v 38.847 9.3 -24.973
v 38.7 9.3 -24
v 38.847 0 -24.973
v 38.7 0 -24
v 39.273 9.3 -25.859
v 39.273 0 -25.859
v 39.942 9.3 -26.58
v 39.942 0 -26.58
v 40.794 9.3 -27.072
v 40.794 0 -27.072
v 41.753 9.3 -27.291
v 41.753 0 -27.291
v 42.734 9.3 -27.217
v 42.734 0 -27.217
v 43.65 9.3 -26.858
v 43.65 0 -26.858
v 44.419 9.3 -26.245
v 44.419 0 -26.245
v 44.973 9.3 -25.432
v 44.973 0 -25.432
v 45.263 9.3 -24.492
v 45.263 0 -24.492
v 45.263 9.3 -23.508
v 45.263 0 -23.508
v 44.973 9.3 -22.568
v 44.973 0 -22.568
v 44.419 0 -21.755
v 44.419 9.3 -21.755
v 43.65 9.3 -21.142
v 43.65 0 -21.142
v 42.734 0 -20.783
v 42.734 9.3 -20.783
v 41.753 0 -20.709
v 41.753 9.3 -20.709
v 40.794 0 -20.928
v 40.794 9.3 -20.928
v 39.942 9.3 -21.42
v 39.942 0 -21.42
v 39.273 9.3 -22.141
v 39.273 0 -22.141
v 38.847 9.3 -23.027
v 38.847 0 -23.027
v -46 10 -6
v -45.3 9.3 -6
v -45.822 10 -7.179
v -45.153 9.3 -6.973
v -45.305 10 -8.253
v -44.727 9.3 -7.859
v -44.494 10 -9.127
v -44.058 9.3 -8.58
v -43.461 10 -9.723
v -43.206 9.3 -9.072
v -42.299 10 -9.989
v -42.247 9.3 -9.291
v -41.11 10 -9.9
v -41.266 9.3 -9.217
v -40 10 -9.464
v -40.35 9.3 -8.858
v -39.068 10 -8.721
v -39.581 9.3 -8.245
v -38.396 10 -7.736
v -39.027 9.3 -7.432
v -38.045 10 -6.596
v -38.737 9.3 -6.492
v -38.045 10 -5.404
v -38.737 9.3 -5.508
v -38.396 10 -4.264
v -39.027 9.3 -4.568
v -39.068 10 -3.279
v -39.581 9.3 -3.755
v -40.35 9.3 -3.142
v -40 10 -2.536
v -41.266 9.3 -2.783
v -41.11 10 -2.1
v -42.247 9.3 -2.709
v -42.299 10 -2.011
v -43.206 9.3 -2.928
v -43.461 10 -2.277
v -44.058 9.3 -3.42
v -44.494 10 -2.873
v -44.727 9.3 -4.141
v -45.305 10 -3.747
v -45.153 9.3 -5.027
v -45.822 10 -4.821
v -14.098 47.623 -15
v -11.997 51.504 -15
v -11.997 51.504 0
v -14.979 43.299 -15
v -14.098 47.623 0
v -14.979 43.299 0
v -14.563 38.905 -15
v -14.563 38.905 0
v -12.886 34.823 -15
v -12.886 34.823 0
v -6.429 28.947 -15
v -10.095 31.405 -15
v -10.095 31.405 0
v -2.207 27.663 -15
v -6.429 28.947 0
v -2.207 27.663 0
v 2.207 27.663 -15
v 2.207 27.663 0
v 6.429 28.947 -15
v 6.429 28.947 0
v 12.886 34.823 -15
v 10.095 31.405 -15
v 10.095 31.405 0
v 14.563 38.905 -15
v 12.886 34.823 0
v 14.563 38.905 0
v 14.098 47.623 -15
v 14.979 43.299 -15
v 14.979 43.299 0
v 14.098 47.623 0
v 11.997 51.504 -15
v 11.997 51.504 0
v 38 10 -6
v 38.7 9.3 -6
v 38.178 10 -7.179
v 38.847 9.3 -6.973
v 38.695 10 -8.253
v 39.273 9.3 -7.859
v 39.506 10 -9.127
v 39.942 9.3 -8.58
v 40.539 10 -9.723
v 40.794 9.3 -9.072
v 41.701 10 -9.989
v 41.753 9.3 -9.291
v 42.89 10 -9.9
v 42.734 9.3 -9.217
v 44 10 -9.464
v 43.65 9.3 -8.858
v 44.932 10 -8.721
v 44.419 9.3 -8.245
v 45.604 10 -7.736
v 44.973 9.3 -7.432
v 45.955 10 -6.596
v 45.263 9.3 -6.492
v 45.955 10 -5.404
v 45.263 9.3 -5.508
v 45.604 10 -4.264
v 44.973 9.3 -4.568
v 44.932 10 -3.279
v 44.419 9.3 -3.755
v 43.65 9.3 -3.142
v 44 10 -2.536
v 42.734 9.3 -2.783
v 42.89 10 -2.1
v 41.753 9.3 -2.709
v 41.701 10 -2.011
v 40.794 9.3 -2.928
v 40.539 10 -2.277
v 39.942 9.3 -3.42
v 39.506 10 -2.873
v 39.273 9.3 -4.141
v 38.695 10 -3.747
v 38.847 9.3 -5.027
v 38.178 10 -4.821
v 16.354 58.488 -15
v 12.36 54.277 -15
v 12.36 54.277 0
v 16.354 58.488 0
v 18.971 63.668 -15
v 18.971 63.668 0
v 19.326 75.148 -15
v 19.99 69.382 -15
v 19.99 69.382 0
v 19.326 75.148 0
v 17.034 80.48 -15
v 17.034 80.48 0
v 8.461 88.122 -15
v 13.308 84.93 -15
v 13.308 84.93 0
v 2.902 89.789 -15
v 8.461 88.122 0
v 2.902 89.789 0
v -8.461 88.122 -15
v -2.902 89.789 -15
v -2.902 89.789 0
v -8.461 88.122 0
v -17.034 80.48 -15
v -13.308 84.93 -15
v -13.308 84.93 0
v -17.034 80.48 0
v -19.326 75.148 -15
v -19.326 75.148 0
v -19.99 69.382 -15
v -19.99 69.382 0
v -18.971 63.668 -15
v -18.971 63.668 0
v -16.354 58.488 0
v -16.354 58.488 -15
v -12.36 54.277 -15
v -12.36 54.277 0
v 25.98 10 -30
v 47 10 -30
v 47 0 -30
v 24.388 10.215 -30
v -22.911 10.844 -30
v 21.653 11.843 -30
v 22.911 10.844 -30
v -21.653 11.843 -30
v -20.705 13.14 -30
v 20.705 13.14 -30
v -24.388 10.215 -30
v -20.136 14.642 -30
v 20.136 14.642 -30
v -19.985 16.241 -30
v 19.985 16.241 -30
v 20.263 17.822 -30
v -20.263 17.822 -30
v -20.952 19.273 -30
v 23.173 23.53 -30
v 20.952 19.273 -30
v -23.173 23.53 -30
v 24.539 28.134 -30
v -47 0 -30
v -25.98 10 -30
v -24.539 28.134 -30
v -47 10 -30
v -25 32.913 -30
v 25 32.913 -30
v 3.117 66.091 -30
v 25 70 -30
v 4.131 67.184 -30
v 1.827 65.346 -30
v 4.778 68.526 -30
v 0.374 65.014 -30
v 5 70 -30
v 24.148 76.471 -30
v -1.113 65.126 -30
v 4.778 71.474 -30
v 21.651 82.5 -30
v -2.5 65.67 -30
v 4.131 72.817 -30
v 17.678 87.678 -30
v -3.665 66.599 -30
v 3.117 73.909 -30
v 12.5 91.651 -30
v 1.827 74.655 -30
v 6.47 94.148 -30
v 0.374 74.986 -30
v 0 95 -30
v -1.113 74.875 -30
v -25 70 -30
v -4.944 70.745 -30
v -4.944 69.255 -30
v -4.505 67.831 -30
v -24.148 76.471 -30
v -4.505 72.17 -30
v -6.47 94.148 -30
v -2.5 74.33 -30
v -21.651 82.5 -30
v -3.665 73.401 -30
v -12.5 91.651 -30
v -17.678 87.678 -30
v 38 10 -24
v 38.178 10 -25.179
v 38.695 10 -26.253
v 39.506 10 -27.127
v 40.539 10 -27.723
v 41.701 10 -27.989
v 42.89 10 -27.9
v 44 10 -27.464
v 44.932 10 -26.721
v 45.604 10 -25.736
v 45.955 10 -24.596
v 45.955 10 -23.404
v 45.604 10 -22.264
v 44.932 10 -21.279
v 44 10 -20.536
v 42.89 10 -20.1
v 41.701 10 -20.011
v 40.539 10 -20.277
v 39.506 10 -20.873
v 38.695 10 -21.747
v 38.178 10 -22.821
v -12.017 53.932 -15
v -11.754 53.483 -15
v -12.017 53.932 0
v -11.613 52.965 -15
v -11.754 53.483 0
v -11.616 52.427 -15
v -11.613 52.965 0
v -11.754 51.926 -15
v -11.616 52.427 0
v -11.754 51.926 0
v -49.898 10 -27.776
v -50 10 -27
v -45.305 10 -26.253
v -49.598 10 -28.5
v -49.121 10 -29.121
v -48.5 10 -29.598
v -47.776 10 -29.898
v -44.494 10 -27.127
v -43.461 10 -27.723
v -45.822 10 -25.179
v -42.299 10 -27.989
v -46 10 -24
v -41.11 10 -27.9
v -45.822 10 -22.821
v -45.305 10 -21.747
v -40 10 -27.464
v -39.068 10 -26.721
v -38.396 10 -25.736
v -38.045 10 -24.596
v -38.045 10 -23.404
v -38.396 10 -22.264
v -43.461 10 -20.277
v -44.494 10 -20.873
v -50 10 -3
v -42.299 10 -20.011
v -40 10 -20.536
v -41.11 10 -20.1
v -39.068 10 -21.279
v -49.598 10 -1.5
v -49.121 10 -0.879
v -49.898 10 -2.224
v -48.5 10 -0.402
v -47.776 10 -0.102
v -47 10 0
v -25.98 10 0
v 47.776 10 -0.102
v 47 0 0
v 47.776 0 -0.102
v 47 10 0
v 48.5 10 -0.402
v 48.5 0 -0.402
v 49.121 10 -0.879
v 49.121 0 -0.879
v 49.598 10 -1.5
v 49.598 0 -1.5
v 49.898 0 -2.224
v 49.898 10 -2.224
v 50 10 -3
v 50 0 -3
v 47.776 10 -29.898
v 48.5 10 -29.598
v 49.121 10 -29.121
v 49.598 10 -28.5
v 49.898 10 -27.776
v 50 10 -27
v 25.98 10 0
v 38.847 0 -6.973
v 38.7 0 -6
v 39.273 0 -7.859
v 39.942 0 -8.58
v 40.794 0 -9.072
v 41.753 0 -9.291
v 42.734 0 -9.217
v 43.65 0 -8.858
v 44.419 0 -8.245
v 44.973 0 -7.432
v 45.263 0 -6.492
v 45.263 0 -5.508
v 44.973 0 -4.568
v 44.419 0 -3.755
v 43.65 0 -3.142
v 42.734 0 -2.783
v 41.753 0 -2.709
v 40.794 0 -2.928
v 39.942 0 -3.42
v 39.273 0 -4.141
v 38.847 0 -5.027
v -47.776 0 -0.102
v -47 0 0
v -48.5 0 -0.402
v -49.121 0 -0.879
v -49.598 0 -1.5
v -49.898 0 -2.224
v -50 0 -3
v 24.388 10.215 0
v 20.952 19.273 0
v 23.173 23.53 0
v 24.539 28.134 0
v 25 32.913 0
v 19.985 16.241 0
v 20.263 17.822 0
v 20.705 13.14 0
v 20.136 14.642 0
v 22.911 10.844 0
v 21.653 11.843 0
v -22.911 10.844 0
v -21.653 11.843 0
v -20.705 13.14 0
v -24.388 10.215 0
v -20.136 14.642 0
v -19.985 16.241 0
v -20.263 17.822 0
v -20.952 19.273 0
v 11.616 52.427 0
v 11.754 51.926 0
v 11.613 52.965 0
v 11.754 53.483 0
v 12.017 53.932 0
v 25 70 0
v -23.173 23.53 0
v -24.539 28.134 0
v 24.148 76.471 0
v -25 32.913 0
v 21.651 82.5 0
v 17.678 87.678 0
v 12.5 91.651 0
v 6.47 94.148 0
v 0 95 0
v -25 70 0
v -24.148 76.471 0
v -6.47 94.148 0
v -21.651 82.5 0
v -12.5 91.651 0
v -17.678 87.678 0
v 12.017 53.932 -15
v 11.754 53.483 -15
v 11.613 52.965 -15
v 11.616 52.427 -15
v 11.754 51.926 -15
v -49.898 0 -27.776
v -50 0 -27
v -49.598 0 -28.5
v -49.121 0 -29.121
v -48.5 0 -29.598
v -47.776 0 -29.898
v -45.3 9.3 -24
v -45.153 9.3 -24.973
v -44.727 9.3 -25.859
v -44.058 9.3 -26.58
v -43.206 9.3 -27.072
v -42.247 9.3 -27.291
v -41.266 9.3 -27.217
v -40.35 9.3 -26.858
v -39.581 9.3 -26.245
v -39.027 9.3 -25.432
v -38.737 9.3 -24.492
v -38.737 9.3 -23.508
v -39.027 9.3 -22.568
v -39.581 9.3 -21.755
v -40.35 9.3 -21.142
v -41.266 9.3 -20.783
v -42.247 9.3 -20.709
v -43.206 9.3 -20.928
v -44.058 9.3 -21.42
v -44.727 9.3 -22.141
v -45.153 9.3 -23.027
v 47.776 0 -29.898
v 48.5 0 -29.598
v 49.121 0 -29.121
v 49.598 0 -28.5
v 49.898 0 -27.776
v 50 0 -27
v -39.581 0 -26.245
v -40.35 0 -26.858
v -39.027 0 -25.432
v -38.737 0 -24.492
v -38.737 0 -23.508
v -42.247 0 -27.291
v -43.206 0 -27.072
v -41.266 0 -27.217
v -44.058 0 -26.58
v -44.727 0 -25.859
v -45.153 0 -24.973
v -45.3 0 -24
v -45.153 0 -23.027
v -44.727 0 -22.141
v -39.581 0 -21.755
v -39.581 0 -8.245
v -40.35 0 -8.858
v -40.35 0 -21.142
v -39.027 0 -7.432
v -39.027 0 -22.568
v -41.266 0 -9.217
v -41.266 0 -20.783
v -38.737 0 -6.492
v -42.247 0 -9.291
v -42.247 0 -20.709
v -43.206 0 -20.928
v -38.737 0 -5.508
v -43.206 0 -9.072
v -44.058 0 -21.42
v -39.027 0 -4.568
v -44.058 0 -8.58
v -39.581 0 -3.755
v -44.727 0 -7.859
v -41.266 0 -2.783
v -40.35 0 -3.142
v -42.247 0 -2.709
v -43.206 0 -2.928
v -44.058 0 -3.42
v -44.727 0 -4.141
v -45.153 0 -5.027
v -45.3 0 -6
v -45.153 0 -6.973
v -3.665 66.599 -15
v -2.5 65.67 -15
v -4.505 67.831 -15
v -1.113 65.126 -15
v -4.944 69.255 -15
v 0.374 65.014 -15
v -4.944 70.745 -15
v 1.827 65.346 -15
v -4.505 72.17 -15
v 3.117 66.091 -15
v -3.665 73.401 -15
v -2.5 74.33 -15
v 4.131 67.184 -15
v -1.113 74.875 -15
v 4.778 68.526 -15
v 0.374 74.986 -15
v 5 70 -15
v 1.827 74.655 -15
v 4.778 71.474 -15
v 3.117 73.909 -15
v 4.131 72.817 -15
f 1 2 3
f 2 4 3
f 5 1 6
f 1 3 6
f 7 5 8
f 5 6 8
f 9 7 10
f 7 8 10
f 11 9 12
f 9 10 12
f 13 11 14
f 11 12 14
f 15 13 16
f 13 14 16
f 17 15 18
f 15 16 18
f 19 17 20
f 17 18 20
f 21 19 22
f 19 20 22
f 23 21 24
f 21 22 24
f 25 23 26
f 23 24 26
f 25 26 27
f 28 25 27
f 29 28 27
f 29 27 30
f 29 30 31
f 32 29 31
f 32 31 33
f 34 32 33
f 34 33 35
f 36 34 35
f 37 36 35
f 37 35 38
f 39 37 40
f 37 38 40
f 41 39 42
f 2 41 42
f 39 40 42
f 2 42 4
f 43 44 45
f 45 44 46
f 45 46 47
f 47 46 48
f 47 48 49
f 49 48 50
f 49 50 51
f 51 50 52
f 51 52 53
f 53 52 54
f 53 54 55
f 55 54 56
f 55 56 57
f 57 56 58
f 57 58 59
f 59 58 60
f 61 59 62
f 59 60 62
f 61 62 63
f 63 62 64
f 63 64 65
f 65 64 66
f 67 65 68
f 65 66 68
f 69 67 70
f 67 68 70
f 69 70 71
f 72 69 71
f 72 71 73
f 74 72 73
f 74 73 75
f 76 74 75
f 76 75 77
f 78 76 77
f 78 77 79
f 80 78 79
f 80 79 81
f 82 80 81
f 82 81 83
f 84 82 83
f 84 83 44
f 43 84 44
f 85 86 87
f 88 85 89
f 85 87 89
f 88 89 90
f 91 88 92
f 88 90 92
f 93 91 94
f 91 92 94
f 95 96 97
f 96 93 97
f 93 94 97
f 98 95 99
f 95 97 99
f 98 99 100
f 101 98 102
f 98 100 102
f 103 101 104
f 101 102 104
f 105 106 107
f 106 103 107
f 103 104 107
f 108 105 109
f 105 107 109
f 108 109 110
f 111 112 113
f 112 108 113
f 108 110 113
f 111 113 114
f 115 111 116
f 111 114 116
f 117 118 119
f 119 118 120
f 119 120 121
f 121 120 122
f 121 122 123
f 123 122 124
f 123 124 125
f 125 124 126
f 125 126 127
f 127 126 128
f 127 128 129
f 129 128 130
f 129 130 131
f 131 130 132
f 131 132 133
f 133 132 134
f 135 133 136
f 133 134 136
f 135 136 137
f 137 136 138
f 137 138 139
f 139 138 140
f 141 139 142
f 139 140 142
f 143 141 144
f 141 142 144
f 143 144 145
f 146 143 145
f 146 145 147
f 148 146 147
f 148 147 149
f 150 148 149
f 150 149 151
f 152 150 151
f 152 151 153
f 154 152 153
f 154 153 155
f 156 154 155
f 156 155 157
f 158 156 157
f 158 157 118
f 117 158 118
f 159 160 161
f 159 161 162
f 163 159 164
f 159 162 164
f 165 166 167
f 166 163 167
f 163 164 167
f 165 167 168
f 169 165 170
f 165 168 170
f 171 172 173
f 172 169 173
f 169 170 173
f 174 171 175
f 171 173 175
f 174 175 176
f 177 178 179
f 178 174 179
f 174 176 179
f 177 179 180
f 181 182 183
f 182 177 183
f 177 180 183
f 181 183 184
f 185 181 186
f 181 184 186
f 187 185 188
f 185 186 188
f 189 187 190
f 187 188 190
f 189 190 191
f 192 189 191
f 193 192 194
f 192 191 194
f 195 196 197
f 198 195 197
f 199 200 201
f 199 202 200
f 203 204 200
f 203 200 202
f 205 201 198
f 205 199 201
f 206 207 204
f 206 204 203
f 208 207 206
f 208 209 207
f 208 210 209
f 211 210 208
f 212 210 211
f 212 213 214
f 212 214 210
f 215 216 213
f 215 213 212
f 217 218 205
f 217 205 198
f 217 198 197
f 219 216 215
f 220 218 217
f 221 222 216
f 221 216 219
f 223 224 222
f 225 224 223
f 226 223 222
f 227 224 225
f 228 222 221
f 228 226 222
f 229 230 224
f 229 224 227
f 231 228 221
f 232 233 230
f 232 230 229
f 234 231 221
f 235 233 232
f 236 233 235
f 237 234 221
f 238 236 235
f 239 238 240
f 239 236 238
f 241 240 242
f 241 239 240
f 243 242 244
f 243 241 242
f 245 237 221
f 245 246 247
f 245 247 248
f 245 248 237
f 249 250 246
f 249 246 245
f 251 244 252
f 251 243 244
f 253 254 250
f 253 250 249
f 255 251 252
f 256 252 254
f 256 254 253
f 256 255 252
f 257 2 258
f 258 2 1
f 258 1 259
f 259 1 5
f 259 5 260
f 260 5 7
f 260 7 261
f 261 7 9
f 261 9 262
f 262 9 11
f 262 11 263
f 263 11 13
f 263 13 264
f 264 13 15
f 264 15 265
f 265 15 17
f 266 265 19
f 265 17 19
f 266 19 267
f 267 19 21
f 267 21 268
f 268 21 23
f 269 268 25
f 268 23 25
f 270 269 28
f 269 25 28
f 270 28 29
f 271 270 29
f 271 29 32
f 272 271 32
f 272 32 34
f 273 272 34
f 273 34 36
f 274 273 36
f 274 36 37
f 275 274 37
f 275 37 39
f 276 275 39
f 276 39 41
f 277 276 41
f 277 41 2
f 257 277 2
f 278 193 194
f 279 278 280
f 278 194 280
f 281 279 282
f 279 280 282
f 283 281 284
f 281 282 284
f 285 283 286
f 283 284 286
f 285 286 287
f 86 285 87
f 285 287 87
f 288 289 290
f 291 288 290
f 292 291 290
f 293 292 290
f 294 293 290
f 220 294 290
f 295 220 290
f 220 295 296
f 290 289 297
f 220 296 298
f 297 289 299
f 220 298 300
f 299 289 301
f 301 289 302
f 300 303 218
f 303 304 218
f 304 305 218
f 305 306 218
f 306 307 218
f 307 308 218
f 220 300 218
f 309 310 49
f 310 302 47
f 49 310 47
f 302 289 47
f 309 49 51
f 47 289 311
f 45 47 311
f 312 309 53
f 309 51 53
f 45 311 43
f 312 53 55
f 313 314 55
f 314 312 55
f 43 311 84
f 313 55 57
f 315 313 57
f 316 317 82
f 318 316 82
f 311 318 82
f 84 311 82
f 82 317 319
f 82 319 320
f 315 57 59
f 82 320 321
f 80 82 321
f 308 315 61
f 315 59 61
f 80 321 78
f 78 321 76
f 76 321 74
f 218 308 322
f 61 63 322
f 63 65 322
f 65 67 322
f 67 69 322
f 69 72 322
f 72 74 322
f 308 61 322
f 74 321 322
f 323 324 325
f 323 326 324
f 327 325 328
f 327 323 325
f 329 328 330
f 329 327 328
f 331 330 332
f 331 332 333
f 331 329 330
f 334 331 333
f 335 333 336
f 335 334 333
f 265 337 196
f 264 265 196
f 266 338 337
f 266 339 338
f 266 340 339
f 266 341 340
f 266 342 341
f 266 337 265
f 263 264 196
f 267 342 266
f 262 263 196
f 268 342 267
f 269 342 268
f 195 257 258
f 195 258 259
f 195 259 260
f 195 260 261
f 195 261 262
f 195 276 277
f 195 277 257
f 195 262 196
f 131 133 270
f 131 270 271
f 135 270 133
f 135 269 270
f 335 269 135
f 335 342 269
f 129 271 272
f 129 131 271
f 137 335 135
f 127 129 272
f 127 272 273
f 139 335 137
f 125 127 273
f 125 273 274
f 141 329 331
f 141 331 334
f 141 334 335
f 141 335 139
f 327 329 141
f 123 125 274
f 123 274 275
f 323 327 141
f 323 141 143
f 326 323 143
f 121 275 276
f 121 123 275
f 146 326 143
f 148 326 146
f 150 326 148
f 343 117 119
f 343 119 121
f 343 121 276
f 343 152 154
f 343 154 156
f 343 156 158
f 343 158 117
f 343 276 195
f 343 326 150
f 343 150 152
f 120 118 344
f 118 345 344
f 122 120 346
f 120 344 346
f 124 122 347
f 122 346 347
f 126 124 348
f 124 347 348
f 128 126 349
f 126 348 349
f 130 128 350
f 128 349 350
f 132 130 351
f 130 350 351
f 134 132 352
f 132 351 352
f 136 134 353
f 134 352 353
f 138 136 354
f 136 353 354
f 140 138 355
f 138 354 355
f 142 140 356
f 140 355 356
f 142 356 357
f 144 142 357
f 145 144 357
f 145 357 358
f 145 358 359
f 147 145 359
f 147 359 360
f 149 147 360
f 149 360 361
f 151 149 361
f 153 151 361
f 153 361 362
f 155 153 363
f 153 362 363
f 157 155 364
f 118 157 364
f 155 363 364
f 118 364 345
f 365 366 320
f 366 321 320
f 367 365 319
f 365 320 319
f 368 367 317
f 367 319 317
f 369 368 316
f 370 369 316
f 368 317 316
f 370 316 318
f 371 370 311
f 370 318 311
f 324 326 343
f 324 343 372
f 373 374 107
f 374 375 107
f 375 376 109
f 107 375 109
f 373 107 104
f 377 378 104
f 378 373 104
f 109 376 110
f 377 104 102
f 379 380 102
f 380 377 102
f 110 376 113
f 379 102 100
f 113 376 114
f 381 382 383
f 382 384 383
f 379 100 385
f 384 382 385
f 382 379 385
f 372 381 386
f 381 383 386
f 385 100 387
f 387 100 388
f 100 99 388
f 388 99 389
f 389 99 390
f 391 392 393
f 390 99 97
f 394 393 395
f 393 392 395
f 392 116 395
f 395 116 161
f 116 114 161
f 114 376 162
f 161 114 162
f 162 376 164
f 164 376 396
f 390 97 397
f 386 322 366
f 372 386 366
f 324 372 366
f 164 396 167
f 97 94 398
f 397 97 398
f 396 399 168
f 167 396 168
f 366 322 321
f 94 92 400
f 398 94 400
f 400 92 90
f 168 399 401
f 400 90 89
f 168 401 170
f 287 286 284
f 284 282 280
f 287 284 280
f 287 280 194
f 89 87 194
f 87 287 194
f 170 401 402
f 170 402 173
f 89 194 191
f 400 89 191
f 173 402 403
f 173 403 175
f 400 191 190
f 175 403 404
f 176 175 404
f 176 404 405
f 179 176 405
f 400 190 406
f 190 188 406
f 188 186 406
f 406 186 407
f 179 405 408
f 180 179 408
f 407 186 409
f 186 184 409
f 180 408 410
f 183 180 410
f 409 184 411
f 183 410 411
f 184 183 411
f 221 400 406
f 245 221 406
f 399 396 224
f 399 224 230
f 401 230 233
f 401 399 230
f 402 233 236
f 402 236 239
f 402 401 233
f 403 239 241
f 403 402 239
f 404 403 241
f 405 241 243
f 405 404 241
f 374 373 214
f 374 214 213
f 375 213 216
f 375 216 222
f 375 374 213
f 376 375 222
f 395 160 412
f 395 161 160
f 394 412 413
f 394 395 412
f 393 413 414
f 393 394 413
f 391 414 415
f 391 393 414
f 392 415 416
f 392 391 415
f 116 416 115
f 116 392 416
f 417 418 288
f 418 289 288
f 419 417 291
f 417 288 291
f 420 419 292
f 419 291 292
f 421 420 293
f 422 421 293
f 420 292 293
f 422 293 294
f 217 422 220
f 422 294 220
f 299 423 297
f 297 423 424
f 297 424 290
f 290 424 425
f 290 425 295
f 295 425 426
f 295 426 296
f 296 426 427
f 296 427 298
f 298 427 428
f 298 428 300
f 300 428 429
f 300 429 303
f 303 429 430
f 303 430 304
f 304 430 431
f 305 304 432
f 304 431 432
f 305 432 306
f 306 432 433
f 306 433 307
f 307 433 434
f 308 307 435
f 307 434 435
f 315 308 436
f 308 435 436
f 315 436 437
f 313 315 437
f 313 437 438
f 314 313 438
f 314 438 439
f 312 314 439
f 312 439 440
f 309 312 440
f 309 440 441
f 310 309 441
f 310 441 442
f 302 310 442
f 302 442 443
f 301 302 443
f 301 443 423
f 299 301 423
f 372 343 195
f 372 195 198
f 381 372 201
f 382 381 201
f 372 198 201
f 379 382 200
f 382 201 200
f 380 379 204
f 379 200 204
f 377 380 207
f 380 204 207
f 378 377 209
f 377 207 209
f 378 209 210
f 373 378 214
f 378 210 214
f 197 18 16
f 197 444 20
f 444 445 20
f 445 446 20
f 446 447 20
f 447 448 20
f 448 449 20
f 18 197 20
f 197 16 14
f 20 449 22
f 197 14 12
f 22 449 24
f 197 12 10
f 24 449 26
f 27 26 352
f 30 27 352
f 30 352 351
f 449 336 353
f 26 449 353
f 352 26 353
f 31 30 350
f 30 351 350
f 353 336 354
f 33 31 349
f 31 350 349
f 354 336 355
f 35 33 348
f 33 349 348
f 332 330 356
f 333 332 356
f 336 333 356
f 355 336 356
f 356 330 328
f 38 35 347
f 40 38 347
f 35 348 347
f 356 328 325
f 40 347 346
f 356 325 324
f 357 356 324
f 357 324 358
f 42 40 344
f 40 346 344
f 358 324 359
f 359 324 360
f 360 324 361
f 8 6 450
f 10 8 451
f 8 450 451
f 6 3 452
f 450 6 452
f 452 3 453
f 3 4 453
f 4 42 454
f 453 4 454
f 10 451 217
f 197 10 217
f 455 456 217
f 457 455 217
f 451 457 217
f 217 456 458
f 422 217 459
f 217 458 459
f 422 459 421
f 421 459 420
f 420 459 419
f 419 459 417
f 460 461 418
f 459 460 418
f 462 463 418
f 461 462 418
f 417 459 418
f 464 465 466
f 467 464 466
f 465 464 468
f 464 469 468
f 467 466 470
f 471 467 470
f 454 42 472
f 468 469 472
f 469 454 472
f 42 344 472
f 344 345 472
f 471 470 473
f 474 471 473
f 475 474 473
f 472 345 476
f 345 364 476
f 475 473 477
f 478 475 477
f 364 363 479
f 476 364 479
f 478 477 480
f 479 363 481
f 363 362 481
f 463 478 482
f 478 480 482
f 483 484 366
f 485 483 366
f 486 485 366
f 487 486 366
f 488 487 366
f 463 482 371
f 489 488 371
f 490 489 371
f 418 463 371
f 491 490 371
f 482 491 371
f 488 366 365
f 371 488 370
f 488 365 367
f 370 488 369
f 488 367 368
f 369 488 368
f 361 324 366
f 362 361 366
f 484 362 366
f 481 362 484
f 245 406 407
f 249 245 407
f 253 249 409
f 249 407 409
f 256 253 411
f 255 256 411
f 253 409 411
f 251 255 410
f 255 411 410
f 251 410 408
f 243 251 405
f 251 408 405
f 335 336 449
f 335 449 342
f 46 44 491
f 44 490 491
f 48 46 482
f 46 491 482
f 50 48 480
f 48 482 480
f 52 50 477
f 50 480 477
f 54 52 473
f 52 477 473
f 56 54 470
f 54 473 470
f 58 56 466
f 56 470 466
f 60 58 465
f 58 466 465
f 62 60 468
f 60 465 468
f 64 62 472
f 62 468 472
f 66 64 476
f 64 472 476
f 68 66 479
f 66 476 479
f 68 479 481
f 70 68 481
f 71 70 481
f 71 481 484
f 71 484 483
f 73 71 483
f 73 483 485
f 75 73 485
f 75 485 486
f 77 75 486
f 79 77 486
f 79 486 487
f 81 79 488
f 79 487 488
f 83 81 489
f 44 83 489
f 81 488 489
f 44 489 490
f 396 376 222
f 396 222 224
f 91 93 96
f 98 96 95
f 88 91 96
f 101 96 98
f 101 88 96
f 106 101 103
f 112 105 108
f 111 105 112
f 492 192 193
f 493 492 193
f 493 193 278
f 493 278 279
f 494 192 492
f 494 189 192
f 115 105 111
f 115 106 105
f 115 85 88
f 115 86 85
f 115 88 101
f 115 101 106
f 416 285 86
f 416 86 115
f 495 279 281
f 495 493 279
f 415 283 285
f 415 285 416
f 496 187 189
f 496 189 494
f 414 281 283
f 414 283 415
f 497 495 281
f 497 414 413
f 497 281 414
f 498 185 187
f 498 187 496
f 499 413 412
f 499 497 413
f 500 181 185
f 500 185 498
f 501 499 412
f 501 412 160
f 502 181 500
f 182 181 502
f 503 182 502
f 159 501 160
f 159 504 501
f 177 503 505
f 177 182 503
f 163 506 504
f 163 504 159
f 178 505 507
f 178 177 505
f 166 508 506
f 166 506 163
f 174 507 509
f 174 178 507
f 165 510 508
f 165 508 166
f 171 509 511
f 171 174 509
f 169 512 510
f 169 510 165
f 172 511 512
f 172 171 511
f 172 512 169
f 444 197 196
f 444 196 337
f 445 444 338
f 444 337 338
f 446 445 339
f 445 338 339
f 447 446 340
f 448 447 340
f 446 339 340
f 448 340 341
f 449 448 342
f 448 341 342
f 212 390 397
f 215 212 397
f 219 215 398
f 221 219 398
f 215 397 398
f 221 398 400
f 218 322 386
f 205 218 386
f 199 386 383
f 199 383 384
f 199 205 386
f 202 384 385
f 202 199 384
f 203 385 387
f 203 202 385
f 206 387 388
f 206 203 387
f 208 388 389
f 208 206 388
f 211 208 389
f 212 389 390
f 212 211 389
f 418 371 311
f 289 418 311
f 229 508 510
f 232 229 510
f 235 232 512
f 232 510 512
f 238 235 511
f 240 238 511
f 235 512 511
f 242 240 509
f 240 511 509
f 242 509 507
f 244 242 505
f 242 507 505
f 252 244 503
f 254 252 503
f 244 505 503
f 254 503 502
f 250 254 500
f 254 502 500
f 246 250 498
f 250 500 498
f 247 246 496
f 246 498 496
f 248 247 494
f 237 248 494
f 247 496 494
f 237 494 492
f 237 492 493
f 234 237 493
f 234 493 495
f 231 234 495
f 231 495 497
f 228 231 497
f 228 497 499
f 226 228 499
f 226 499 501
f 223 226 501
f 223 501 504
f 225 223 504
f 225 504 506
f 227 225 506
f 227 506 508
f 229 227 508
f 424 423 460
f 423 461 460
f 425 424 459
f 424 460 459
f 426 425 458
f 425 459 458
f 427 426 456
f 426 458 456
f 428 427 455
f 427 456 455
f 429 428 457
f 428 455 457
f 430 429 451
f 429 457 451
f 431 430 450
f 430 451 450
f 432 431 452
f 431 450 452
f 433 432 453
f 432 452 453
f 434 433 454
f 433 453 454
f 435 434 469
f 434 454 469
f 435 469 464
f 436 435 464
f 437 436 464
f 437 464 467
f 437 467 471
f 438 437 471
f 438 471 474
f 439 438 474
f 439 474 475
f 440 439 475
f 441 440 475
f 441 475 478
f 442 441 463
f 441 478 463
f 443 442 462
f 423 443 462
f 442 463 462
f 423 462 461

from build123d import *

# Parameters (mm, degrees)
EXTRUDE_1_DEPTH             = 30
SKETCH_2_R                  = 20
CUT_EXTRUDE_1_DEPTH         = 15
SKETCH_3_R                  = 5
CUT_EXTRUDE_2_DEPTH         = 109.397550478
FILLET_5_R                  = 6
SKETCH_4_R                  = 15
CUT_EXTRUDE_3_DEPTH         = 15
FILLET_6_R                  = 2
HOLE_WIZARD_M62_D           = 6.6
HOLE_WIZARD_M62_CSINK_D     = 8
HOLE_WIZARD_M62_CSINK_ANGLE = 90
PATTERN_LINEAR_1_COUNT      = 2
PATTERN_LINEAR_1_PITCH      = 18
PATTERN_LINEAR_1_COUNT_DIR2 = 2
PATTERN_LINEAR_1_PITCH_DIR2 = 84
FILLET_7_R                  = 3


with BuildPart() as part:
    # Эскиз1 → Бобышка-Вытянуть1 (new body)
    with BuildSketch(Plane.XY):
        with BuildLine():
            Line((0, 10), (0, 0))
            Line((0, 0), (50, 0))
            Line((50, 0), (50, 10))
            Line((50, 10), (10, 10))
            ThreePointArc((10, 10), (20.916500663, 19.219814537), (25, 32.912878475))
            Line((25, 32.912878475), (25, 70.000152367))
            ThreePointArc((25, 70.000152367), (17.67766953, 87.677821896), (0, 95.000152367))
            Line((0, 95.000152367), (0, 32.912878475))
            Line((0, 32.912878475), (0, 10))
        make_face()
    extrude_1 = extrude(amount=-EXTRUDE_1_DEPTH)

    # Зеркальное отражение1: Бобышка-Вытянуть1 across plane
    add(extrude_1.mirror(Plane(origin=(0, 95.000152367, -30), x_dir=(0, 0, 1), z_dir=(-1, 0, 0))))

    # Эскиз2 → Вырез-Вытянуть1 (cut)
    with BuildSketch(Plane.XY):
        with Locations((0, 70.000152367)):
            Circle(SKETCH_2_R)
    extrude(amount=-CUT_EXTRUDE_1_DEPTH, mode=Mode.SUBTRACT)

    # Эскиз3 → Вырез-Вытянуть2 (cut, through all)
    with BuildSketch(Plane.XY.offset(-15)):
        with Locations((0, 70.000152367)):
            Circle(SKETCH_3_R)
    extrude(amount=-CUT_EXTRUDE_2_DEPTH, mode=Mode.SUBTRACT)

    # Скругление5
    fillet_5_edges = [part.edges().sort_by_distance(p)[0] for p in [
        (10, 10, -15),
        (-10, 10, -15),
    ]]
    fillet(fillet_5_edges, radius=FILLET_5_R)

    # Эскиз4 → Вырез-Вытянуть3 (cut)
    with BuildSketch(Plane.XY):
        with Locations((0, 42.5)):
            Circle(SKETCH_4_R)
    extrude(amount=-CUT_EXTRUDE_3_DEPTH, mode=Mode.SUBTRACT)

    # Скругление6
    fillet_6_edges = [part.edges().sort_by_distance(p)[0] for p in [
        (10.644789814, 53.068275631, -7.5),
        (-10.644789814, 53.068275631, -7.5),
    ]]
    fillet(fillet_6_edges, radius=FILLET_6_R)

    # Зенковка для винта с полупотайной головкой M62 (through all)
    with Locations(Plane(origin=(42, 10, -24), x_dir=(1, 0, 0), z_dir=(0, 1, 0))):
        with Locations((0, 0)):
            hole_wizard_m62 = CounterSinkHole(HOLE_WIZARD_M62_D / 2, HOLE_WIZARD_M62_CSINK_D / 2, counter_sink_angle=HOLE_WIZARD_M62_CSINK_ANGLE)

    # Линейный массив1: Hole Wizard M62 2 × 2
    with Locations(*[(-j * PATTERN_LINEAR_1_PITCH_DIR2, 0, i * PATTERN_LINEAR_1_PITCH) for i in range(PATTERN_LINEAR_1_COUNT) for j in range(PATTERN_LINEAR_1_COUNT_DIR2) if (i, j) != (0, 0)]):
        add(hole_wizard_m62, mode=Mode.SUBTRACT)

    # Скругление7
    fillet_7_edges = [part.edges().sort_by_distance(p)[0] for p in [
        (50, 5, 0),
        (50, 5, -30),
        (-50, 5, 0),
        (-50, 5, -30),
    ]]
    fillet(fillet_7_edges, radius=FILLET_7_R)


solid = part.part
